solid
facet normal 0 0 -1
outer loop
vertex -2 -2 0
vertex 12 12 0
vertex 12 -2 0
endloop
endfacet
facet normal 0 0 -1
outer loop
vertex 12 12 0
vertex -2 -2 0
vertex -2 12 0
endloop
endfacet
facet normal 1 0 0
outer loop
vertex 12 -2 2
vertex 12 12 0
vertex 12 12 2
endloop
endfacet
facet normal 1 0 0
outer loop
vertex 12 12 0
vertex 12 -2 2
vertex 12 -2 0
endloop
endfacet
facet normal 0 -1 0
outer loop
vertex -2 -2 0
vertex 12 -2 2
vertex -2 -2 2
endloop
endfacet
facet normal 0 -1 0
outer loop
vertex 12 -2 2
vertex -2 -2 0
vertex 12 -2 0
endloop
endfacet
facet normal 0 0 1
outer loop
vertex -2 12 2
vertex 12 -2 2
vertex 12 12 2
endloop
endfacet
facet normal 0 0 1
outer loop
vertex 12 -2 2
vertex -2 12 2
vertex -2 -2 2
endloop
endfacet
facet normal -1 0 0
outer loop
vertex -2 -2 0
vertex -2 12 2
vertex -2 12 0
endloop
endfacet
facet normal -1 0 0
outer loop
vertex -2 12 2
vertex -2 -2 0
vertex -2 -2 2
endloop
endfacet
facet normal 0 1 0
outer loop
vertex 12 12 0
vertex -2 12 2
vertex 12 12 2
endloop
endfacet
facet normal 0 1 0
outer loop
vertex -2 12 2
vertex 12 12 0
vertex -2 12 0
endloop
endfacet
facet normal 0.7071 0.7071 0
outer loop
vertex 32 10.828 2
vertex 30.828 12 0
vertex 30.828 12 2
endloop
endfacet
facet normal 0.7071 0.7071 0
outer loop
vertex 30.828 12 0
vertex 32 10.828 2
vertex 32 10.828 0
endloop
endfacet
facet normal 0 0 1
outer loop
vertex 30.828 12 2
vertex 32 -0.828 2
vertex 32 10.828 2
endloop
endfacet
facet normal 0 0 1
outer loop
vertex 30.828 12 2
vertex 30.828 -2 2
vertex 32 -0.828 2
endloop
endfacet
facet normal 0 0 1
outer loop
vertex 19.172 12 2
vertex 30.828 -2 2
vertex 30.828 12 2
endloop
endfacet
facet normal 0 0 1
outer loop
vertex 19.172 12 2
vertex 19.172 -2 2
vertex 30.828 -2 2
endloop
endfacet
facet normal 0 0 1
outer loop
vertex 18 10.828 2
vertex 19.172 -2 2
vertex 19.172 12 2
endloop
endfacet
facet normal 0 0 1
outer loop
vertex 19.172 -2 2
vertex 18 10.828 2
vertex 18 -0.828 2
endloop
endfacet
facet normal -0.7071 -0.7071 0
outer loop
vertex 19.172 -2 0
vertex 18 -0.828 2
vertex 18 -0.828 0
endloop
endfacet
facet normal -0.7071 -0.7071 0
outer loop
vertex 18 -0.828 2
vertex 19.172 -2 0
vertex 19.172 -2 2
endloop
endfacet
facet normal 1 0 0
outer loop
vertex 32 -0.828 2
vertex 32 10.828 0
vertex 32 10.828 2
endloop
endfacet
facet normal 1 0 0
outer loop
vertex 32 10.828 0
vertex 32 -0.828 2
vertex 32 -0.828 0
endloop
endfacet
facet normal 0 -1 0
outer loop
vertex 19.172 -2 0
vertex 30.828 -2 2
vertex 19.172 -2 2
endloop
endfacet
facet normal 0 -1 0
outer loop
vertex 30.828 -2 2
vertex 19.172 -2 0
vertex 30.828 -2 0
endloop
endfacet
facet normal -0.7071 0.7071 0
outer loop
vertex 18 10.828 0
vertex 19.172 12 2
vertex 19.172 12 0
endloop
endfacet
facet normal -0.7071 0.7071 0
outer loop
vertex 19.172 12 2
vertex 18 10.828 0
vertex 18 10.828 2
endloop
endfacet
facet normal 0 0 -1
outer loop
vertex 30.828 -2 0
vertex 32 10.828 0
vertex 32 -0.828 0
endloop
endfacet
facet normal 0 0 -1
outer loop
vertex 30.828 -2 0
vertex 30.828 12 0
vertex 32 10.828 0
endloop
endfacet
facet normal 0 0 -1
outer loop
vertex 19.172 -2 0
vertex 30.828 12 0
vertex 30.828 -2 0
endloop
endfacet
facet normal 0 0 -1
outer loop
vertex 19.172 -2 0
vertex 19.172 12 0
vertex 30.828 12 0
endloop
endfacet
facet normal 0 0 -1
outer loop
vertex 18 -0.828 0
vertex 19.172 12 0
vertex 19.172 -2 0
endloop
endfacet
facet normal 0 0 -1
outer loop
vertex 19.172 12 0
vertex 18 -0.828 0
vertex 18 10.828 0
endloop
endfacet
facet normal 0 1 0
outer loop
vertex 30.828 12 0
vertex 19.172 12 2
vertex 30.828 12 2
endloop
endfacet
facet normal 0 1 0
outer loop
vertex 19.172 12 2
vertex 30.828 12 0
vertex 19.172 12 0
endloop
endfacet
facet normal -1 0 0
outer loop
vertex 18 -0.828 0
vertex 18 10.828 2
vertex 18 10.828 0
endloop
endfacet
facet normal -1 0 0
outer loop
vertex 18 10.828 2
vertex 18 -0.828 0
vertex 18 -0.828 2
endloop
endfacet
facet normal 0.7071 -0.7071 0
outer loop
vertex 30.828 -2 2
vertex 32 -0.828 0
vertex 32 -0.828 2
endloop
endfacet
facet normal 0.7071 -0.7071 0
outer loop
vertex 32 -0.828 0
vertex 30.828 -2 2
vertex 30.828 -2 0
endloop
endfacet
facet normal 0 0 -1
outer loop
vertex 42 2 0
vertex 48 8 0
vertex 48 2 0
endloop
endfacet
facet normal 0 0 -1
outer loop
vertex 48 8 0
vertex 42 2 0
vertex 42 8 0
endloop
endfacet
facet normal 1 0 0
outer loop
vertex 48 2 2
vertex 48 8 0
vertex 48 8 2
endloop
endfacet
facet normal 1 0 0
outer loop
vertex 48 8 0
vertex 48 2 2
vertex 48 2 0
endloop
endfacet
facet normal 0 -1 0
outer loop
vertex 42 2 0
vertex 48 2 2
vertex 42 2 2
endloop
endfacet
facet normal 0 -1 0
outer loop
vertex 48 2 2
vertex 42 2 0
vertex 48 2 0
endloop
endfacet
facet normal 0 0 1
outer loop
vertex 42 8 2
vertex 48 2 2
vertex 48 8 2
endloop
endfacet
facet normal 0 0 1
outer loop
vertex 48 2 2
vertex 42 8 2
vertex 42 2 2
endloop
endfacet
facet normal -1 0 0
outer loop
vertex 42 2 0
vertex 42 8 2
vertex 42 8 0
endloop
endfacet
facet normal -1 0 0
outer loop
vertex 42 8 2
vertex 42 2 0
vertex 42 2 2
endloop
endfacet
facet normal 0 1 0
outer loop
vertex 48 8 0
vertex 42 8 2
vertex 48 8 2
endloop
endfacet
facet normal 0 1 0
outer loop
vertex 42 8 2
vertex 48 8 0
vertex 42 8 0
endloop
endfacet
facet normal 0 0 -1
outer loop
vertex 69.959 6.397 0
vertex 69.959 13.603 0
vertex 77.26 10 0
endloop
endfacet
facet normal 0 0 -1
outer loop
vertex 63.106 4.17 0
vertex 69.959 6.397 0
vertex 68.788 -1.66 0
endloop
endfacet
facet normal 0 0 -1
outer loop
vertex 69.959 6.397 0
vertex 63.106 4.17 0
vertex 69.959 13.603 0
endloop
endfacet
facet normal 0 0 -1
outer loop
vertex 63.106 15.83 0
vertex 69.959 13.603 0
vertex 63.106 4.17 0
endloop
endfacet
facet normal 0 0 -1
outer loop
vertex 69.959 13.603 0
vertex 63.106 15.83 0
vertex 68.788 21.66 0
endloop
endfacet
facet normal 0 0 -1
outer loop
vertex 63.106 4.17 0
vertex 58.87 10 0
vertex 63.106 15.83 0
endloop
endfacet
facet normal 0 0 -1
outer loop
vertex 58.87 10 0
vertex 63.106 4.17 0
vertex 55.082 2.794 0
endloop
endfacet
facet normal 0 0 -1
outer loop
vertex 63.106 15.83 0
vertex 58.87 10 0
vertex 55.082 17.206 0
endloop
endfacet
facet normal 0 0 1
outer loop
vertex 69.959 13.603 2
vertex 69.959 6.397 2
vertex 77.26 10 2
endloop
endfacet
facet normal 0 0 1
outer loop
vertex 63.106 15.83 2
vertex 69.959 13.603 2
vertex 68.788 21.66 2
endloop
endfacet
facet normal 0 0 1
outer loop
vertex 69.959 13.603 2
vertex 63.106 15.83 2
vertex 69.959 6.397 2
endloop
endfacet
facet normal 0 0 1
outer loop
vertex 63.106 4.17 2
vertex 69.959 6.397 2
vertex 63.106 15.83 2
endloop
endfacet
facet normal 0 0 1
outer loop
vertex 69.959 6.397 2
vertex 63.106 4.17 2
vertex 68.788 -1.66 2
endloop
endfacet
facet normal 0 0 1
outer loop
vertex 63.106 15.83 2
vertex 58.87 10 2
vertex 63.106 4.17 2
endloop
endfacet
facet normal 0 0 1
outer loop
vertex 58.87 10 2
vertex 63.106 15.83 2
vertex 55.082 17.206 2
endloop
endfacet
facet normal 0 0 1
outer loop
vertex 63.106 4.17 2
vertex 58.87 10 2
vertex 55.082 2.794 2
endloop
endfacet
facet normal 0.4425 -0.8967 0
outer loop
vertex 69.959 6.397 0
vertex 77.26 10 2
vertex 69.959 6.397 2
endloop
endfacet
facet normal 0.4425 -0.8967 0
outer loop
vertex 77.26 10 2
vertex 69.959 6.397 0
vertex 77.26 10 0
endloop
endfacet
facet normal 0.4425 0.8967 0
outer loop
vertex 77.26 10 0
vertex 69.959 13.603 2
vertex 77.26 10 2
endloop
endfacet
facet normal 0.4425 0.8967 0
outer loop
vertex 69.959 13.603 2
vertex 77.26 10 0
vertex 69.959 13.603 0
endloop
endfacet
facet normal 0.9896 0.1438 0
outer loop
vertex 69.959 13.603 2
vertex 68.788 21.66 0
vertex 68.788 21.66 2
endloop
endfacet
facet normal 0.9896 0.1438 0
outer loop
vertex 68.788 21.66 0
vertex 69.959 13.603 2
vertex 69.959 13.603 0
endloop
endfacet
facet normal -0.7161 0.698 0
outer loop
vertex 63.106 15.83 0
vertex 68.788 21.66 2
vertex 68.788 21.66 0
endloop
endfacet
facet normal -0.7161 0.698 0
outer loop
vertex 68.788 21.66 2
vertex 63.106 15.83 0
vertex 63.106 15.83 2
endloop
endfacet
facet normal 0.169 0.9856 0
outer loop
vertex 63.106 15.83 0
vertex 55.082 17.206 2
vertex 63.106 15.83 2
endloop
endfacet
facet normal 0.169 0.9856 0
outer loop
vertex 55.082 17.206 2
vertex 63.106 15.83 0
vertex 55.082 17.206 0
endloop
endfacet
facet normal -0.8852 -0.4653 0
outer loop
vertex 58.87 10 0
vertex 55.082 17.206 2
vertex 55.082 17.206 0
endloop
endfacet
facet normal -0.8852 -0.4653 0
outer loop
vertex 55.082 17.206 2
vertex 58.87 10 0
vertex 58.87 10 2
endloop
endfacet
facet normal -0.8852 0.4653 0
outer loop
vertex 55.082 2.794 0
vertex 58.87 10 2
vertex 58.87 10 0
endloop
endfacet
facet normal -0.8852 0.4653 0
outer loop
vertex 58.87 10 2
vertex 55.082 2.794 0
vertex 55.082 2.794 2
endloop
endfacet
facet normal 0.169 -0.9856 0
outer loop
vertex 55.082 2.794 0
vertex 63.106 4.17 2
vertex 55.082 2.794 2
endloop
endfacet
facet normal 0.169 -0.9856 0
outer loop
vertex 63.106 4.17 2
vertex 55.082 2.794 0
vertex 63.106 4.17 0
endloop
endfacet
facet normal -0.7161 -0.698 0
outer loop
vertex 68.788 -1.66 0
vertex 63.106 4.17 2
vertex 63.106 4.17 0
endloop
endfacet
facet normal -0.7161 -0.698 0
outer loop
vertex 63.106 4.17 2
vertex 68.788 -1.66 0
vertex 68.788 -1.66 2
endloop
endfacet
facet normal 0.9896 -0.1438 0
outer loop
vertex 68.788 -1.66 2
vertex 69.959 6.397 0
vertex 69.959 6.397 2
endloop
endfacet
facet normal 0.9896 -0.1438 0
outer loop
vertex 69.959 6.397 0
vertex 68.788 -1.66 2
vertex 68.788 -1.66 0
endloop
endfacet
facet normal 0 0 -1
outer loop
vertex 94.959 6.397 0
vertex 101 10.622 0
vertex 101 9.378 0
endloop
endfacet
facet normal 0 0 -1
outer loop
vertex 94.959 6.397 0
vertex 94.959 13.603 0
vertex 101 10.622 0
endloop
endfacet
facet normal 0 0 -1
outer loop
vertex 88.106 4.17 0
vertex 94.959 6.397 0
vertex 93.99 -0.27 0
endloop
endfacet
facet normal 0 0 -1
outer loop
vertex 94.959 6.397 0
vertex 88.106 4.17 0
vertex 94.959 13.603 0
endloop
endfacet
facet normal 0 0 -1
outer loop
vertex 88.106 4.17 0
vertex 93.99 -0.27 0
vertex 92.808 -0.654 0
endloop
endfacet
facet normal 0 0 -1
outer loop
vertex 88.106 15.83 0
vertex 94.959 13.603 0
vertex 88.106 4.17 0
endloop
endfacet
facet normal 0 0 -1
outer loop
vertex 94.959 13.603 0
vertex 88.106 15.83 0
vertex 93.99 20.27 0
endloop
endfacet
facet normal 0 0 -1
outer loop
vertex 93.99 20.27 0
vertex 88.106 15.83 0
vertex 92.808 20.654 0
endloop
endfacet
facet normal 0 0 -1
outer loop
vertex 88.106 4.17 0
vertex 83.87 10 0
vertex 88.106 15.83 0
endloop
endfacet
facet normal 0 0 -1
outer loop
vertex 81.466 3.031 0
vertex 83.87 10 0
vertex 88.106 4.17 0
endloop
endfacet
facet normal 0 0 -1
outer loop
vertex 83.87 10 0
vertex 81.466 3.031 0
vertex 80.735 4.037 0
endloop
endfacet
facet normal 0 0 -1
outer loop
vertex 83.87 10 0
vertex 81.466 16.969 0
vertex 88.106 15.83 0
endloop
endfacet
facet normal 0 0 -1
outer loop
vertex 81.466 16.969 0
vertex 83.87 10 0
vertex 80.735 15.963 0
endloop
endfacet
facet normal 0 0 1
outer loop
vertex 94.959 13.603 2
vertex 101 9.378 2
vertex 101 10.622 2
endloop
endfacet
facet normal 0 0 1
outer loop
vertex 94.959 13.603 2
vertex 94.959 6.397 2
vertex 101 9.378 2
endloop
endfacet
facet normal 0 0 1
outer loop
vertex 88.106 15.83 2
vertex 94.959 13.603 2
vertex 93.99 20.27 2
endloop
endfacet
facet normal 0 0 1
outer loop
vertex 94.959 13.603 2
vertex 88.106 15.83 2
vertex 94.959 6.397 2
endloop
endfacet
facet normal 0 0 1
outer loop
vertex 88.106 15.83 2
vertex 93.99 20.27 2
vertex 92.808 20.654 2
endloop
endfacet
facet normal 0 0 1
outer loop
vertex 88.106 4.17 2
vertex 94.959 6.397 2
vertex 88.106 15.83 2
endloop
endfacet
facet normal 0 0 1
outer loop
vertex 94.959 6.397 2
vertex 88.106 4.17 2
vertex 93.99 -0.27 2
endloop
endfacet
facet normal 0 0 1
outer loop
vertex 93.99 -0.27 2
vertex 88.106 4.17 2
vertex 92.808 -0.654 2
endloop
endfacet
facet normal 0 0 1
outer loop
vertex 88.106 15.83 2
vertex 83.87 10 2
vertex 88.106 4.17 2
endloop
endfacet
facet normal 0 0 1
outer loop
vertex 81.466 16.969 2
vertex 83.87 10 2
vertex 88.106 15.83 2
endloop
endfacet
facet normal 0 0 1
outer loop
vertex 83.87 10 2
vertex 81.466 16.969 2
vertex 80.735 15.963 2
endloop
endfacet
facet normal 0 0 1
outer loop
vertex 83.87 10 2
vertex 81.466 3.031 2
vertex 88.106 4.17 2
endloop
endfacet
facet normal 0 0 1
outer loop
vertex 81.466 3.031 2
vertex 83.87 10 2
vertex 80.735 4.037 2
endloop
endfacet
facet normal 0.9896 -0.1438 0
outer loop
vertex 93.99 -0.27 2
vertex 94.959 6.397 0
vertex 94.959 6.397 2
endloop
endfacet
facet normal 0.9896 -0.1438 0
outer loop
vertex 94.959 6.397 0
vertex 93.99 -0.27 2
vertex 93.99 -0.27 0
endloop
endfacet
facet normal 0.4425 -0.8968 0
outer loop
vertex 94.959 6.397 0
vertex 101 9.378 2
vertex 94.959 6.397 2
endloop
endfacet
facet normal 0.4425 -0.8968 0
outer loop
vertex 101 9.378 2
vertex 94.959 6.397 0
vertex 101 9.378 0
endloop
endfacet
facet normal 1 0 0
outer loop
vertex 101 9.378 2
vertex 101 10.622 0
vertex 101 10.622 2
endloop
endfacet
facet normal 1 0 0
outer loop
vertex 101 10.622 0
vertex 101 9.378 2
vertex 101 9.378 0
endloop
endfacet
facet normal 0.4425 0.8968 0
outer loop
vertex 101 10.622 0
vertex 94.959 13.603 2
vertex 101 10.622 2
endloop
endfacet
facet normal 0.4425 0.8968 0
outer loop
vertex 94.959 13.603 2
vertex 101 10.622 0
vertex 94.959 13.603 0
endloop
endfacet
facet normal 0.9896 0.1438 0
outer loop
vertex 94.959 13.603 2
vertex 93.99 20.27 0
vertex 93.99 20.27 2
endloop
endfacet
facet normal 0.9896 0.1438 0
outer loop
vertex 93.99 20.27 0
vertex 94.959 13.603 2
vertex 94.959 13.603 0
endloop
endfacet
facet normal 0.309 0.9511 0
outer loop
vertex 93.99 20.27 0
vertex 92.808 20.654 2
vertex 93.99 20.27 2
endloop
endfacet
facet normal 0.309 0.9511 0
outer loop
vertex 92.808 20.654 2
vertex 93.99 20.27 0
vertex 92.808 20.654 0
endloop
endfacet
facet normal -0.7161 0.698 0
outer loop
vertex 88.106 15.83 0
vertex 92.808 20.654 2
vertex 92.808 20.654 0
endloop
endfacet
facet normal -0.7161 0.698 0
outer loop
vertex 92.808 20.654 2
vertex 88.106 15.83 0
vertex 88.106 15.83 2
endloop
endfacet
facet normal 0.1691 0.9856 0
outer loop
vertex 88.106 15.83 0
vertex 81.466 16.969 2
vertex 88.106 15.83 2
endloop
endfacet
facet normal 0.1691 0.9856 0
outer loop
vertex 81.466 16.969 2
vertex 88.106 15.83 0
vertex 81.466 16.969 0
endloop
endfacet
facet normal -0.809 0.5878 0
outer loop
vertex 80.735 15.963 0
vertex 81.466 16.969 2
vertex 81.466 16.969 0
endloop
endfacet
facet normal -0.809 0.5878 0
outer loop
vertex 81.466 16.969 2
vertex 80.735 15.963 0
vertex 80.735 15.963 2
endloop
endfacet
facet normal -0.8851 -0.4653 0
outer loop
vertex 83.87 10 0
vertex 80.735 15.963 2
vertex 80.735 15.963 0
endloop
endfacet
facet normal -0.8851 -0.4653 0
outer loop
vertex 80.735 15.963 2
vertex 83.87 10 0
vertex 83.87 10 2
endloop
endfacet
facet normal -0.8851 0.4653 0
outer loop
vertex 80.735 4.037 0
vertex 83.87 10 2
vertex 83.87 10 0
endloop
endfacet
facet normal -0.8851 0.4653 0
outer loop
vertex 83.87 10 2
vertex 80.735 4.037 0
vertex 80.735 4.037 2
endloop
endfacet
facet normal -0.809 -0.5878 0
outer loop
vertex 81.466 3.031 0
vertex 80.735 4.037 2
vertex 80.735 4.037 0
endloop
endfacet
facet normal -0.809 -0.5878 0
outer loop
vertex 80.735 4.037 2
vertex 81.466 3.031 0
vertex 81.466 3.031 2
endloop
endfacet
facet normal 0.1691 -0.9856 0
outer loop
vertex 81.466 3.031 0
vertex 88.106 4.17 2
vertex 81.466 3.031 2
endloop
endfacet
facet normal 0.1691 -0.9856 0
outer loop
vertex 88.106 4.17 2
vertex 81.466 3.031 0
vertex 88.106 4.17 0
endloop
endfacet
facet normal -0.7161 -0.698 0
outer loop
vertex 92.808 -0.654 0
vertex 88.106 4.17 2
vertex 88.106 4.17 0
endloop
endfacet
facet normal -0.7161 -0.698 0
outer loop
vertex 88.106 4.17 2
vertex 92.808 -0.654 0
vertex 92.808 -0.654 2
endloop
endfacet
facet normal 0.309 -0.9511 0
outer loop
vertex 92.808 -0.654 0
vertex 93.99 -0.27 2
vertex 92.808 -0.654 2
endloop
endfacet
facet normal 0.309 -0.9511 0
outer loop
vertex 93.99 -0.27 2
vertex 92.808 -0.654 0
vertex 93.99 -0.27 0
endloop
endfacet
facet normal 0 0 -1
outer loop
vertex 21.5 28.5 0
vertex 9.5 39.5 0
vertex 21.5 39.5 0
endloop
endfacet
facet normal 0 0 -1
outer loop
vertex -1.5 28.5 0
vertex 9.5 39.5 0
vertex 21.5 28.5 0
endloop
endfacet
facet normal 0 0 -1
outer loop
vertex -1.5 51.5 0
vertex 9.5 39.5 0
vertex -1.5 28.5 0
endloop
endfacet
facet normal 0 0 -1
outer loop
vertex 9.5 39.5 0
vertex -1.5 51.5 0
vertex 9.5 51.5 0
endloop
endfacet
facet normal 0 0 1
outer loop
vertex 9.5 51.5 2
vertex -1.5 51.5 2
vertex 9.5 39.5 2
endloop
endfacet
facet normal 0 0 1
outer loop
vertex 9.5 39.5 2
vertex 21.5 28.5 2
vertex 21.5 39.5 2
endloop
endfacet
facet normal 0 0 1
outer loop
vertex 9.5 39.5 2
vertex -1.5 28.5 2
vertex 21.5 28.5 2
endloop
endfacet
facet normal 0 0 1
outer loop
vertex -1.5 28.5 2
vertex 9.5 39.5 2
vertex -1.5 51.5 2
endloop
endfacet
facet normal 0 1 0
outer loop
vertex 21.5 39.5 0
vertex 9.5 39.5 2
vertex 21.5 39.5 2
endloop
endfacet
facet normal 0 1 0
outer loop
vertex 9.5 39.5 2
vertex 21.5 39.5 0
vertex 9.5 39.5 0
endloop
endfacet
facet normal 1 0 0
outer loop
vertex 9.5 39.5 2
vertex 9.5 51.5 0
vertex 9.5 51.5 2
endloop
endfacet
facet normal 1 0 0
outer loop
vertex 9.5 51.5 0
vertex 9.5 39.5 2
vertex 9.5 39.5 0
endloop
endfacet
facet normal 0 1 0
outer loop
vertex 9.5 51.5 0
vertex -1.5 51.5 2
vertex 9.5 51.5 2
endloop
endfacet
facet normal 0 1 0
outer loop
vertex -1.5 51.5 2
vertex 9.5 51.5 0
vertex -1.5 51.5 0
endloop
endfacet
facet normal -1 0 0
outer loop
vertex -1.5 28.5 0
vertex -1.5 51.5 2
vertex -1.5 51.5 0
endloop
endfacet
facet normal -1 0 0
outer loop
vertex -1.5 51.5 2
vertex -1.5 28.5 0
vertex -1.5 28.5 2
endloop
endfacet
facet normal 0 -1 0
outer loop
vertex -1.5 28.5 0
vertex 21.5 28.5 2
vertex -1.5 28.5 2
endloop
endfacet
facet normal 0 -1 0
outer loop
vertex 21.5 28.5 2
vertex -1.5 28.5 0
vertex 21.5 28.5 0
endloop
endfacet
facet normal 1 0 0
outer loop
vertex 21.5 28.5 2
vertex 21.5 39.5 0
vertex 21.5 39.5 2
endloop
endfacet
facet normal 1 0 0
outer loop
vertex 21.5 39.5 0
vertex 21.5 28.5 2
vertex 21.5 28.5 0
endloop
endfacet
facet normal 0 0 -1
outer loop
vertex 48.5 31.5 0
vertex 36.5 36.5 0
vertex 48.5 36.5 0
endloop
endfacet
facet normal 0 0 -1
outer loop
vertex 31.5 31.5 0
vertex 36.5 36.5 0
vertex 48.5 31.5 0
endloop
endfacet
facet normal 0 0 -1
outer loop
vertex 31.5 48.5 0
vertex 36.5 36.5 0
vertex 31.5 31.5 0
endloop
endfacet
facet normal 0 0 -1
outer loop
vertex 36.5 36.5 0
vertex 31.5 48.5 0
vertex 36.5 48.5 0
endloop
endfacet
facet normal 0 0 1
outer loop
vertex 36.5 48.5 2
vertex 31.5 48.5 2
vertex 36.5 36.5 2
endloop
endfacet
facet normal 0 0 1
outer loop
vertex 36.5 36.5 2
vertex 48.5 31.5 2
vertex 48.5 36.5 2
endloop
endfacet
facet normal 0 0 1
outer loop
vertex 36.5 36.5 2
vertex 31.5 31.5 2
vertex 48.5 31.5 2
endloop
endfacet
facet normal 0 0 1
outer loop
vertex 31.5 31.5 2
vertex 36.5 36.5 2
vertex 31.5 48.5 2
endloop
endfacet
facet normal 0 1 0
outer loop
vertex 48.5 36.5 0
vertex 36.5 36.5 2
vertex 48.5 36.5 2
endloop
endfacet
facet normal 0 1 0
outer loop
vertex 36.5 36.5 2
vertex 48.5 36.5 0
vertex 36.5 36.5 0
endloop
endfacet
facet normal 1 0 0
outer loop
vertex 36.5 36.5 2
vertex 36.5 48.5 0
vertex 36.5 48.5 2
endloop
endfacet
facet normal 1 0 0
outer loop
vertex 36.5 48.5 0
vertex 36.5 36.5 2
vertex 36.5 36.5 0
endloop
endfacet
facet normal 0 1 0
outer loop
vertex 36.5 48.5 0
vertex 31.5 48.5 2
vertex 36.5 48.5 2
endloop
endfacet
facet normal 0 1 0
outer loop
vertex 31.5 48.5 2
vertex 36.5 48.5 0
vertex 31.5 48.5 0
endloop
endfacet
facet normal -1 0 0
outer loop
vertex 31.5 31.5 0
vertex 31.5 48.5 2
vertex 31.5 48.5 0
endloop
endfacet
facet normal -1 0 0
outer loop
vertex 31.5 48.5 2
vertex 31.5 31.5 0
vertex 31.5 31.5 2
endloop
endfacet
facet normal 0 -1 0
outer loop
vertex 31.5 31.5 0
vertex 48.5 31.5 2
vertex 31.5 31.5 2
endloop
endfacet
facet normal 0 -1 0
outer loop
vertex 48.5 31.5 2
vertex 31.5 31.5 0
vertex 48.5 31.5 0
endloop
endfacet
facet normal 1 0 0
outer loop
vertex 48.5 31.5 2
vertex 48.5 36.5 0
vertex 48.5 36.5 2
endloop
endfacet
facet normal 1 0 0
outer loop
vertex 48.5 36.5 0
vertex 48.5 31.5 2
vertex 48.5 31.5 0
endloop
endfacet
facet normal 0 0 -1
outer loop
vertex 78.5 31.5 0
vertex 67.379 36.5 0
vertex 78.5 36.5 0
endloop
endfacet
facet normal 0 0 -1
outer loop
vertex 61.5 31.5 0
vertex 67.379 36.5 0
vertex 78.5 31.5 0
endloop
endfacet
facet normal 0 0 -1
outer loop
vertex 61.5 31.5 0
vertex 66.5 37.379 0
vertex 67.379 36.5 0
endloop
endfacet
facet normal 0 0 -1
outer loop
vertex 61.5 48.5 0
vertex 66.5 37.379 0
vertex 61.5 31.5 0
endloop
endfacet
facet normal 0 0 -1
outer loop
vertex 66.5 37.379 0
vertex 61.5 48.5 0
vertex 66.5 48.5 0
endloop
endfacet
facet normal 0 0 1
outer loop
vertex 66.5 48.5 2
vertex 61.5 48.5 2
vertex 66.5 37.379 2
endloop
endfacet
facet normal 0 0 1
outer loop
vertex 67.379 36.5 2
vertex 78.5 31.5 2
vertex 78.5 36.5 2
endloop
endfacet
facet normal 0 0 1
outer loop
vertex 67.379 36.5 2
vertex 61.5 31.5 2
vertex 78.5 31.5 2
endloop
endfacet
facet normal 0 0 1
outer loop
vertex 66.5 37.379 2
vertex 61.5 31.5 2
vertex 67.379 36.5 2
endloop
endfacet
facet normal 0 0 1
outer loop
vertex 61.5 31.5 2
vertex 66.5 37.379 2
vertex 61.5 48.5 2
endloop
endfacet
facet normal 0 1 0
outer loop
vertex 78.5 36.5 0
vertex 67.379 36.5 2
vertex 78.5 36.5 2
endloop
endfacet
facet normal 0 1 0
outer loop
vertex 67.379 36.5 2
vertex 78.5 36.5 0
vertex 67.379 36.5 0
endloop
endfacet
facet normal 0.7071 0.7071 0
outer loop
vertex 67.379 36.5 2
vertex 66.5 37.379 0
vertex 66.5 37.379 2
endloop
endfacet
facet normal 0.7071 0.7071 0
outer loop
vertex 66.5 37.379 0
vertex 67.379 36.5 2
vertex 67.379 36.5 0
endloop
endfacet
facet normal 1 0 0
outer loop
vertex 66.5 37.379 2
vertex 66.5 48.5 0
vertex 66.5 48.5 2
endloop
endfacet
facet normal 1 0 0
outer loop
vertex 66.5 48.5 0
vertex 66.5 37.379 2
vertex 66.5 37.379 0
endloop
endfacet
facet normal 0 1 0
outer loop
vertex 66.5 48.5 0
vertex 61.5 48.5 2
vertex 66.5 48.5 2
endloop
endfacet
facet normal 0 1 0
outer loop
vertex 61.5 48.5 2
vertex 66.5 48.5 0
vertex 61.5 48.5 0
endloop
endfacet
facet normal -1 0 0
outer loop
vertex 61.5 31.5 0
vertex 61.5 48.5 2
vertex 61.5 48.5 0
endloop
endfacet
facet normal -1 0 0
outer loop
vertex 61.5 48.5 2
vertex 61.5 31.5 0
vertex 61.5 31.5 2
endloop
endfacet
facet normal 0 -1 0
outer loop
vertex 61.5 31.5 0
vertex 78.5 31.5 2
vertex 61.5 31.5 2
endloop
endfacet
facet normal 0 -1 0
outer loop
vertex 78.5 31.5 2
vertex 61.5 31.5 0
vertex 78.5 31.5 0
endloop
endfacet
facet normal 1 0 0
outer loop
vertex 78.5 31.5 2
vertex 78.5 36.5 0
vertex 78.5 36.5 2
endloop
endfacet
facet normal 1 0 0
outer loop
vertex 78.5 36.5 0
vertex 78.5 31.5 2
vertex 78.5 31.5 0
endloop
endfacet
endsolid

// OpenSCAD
// Zweck: offset(delta) – Gehrung an konvexen Ecken, mit chamfer = true Fasen, negativ nach innen.
module stern() polygon([for (i = [0 : 9]) let(a = i * 36, r = i % 2 == 0 ? 10 : 5) [r * cos(a), r * sin(a)]]);
module l_form() polygon([[0, 0], [20, 0], [20, 8], [8, 8], [8, 20], [0, 20]]);

linear_extrude(2) offset(delta = 2) square(10);
translate([20, 0, 0]) linear_extrude(2) offset(delta = 2, chamfer = true) square(10);
translate([40, 0, 0]) linear_extrude(2) offset(delta = -2) square(10);
translate([65, 10, 0]) linear_extrude(2) offset(delta = 1) stern();
translate([90, 10, 0]) linear_extrude(2) offset(delta = 1, chamfer = true) stern();
translate([0, 30, 0]) linear_extrude(2) offset(delta = 1.5) l_form();
translate([30, 30, 0]) linear_extrude(2) offset(delta = -1.5) l_form();
translate([60, 30, 0]) linear_extrude(2) offset(delta = -1.5, chamfer = true) l_form();
